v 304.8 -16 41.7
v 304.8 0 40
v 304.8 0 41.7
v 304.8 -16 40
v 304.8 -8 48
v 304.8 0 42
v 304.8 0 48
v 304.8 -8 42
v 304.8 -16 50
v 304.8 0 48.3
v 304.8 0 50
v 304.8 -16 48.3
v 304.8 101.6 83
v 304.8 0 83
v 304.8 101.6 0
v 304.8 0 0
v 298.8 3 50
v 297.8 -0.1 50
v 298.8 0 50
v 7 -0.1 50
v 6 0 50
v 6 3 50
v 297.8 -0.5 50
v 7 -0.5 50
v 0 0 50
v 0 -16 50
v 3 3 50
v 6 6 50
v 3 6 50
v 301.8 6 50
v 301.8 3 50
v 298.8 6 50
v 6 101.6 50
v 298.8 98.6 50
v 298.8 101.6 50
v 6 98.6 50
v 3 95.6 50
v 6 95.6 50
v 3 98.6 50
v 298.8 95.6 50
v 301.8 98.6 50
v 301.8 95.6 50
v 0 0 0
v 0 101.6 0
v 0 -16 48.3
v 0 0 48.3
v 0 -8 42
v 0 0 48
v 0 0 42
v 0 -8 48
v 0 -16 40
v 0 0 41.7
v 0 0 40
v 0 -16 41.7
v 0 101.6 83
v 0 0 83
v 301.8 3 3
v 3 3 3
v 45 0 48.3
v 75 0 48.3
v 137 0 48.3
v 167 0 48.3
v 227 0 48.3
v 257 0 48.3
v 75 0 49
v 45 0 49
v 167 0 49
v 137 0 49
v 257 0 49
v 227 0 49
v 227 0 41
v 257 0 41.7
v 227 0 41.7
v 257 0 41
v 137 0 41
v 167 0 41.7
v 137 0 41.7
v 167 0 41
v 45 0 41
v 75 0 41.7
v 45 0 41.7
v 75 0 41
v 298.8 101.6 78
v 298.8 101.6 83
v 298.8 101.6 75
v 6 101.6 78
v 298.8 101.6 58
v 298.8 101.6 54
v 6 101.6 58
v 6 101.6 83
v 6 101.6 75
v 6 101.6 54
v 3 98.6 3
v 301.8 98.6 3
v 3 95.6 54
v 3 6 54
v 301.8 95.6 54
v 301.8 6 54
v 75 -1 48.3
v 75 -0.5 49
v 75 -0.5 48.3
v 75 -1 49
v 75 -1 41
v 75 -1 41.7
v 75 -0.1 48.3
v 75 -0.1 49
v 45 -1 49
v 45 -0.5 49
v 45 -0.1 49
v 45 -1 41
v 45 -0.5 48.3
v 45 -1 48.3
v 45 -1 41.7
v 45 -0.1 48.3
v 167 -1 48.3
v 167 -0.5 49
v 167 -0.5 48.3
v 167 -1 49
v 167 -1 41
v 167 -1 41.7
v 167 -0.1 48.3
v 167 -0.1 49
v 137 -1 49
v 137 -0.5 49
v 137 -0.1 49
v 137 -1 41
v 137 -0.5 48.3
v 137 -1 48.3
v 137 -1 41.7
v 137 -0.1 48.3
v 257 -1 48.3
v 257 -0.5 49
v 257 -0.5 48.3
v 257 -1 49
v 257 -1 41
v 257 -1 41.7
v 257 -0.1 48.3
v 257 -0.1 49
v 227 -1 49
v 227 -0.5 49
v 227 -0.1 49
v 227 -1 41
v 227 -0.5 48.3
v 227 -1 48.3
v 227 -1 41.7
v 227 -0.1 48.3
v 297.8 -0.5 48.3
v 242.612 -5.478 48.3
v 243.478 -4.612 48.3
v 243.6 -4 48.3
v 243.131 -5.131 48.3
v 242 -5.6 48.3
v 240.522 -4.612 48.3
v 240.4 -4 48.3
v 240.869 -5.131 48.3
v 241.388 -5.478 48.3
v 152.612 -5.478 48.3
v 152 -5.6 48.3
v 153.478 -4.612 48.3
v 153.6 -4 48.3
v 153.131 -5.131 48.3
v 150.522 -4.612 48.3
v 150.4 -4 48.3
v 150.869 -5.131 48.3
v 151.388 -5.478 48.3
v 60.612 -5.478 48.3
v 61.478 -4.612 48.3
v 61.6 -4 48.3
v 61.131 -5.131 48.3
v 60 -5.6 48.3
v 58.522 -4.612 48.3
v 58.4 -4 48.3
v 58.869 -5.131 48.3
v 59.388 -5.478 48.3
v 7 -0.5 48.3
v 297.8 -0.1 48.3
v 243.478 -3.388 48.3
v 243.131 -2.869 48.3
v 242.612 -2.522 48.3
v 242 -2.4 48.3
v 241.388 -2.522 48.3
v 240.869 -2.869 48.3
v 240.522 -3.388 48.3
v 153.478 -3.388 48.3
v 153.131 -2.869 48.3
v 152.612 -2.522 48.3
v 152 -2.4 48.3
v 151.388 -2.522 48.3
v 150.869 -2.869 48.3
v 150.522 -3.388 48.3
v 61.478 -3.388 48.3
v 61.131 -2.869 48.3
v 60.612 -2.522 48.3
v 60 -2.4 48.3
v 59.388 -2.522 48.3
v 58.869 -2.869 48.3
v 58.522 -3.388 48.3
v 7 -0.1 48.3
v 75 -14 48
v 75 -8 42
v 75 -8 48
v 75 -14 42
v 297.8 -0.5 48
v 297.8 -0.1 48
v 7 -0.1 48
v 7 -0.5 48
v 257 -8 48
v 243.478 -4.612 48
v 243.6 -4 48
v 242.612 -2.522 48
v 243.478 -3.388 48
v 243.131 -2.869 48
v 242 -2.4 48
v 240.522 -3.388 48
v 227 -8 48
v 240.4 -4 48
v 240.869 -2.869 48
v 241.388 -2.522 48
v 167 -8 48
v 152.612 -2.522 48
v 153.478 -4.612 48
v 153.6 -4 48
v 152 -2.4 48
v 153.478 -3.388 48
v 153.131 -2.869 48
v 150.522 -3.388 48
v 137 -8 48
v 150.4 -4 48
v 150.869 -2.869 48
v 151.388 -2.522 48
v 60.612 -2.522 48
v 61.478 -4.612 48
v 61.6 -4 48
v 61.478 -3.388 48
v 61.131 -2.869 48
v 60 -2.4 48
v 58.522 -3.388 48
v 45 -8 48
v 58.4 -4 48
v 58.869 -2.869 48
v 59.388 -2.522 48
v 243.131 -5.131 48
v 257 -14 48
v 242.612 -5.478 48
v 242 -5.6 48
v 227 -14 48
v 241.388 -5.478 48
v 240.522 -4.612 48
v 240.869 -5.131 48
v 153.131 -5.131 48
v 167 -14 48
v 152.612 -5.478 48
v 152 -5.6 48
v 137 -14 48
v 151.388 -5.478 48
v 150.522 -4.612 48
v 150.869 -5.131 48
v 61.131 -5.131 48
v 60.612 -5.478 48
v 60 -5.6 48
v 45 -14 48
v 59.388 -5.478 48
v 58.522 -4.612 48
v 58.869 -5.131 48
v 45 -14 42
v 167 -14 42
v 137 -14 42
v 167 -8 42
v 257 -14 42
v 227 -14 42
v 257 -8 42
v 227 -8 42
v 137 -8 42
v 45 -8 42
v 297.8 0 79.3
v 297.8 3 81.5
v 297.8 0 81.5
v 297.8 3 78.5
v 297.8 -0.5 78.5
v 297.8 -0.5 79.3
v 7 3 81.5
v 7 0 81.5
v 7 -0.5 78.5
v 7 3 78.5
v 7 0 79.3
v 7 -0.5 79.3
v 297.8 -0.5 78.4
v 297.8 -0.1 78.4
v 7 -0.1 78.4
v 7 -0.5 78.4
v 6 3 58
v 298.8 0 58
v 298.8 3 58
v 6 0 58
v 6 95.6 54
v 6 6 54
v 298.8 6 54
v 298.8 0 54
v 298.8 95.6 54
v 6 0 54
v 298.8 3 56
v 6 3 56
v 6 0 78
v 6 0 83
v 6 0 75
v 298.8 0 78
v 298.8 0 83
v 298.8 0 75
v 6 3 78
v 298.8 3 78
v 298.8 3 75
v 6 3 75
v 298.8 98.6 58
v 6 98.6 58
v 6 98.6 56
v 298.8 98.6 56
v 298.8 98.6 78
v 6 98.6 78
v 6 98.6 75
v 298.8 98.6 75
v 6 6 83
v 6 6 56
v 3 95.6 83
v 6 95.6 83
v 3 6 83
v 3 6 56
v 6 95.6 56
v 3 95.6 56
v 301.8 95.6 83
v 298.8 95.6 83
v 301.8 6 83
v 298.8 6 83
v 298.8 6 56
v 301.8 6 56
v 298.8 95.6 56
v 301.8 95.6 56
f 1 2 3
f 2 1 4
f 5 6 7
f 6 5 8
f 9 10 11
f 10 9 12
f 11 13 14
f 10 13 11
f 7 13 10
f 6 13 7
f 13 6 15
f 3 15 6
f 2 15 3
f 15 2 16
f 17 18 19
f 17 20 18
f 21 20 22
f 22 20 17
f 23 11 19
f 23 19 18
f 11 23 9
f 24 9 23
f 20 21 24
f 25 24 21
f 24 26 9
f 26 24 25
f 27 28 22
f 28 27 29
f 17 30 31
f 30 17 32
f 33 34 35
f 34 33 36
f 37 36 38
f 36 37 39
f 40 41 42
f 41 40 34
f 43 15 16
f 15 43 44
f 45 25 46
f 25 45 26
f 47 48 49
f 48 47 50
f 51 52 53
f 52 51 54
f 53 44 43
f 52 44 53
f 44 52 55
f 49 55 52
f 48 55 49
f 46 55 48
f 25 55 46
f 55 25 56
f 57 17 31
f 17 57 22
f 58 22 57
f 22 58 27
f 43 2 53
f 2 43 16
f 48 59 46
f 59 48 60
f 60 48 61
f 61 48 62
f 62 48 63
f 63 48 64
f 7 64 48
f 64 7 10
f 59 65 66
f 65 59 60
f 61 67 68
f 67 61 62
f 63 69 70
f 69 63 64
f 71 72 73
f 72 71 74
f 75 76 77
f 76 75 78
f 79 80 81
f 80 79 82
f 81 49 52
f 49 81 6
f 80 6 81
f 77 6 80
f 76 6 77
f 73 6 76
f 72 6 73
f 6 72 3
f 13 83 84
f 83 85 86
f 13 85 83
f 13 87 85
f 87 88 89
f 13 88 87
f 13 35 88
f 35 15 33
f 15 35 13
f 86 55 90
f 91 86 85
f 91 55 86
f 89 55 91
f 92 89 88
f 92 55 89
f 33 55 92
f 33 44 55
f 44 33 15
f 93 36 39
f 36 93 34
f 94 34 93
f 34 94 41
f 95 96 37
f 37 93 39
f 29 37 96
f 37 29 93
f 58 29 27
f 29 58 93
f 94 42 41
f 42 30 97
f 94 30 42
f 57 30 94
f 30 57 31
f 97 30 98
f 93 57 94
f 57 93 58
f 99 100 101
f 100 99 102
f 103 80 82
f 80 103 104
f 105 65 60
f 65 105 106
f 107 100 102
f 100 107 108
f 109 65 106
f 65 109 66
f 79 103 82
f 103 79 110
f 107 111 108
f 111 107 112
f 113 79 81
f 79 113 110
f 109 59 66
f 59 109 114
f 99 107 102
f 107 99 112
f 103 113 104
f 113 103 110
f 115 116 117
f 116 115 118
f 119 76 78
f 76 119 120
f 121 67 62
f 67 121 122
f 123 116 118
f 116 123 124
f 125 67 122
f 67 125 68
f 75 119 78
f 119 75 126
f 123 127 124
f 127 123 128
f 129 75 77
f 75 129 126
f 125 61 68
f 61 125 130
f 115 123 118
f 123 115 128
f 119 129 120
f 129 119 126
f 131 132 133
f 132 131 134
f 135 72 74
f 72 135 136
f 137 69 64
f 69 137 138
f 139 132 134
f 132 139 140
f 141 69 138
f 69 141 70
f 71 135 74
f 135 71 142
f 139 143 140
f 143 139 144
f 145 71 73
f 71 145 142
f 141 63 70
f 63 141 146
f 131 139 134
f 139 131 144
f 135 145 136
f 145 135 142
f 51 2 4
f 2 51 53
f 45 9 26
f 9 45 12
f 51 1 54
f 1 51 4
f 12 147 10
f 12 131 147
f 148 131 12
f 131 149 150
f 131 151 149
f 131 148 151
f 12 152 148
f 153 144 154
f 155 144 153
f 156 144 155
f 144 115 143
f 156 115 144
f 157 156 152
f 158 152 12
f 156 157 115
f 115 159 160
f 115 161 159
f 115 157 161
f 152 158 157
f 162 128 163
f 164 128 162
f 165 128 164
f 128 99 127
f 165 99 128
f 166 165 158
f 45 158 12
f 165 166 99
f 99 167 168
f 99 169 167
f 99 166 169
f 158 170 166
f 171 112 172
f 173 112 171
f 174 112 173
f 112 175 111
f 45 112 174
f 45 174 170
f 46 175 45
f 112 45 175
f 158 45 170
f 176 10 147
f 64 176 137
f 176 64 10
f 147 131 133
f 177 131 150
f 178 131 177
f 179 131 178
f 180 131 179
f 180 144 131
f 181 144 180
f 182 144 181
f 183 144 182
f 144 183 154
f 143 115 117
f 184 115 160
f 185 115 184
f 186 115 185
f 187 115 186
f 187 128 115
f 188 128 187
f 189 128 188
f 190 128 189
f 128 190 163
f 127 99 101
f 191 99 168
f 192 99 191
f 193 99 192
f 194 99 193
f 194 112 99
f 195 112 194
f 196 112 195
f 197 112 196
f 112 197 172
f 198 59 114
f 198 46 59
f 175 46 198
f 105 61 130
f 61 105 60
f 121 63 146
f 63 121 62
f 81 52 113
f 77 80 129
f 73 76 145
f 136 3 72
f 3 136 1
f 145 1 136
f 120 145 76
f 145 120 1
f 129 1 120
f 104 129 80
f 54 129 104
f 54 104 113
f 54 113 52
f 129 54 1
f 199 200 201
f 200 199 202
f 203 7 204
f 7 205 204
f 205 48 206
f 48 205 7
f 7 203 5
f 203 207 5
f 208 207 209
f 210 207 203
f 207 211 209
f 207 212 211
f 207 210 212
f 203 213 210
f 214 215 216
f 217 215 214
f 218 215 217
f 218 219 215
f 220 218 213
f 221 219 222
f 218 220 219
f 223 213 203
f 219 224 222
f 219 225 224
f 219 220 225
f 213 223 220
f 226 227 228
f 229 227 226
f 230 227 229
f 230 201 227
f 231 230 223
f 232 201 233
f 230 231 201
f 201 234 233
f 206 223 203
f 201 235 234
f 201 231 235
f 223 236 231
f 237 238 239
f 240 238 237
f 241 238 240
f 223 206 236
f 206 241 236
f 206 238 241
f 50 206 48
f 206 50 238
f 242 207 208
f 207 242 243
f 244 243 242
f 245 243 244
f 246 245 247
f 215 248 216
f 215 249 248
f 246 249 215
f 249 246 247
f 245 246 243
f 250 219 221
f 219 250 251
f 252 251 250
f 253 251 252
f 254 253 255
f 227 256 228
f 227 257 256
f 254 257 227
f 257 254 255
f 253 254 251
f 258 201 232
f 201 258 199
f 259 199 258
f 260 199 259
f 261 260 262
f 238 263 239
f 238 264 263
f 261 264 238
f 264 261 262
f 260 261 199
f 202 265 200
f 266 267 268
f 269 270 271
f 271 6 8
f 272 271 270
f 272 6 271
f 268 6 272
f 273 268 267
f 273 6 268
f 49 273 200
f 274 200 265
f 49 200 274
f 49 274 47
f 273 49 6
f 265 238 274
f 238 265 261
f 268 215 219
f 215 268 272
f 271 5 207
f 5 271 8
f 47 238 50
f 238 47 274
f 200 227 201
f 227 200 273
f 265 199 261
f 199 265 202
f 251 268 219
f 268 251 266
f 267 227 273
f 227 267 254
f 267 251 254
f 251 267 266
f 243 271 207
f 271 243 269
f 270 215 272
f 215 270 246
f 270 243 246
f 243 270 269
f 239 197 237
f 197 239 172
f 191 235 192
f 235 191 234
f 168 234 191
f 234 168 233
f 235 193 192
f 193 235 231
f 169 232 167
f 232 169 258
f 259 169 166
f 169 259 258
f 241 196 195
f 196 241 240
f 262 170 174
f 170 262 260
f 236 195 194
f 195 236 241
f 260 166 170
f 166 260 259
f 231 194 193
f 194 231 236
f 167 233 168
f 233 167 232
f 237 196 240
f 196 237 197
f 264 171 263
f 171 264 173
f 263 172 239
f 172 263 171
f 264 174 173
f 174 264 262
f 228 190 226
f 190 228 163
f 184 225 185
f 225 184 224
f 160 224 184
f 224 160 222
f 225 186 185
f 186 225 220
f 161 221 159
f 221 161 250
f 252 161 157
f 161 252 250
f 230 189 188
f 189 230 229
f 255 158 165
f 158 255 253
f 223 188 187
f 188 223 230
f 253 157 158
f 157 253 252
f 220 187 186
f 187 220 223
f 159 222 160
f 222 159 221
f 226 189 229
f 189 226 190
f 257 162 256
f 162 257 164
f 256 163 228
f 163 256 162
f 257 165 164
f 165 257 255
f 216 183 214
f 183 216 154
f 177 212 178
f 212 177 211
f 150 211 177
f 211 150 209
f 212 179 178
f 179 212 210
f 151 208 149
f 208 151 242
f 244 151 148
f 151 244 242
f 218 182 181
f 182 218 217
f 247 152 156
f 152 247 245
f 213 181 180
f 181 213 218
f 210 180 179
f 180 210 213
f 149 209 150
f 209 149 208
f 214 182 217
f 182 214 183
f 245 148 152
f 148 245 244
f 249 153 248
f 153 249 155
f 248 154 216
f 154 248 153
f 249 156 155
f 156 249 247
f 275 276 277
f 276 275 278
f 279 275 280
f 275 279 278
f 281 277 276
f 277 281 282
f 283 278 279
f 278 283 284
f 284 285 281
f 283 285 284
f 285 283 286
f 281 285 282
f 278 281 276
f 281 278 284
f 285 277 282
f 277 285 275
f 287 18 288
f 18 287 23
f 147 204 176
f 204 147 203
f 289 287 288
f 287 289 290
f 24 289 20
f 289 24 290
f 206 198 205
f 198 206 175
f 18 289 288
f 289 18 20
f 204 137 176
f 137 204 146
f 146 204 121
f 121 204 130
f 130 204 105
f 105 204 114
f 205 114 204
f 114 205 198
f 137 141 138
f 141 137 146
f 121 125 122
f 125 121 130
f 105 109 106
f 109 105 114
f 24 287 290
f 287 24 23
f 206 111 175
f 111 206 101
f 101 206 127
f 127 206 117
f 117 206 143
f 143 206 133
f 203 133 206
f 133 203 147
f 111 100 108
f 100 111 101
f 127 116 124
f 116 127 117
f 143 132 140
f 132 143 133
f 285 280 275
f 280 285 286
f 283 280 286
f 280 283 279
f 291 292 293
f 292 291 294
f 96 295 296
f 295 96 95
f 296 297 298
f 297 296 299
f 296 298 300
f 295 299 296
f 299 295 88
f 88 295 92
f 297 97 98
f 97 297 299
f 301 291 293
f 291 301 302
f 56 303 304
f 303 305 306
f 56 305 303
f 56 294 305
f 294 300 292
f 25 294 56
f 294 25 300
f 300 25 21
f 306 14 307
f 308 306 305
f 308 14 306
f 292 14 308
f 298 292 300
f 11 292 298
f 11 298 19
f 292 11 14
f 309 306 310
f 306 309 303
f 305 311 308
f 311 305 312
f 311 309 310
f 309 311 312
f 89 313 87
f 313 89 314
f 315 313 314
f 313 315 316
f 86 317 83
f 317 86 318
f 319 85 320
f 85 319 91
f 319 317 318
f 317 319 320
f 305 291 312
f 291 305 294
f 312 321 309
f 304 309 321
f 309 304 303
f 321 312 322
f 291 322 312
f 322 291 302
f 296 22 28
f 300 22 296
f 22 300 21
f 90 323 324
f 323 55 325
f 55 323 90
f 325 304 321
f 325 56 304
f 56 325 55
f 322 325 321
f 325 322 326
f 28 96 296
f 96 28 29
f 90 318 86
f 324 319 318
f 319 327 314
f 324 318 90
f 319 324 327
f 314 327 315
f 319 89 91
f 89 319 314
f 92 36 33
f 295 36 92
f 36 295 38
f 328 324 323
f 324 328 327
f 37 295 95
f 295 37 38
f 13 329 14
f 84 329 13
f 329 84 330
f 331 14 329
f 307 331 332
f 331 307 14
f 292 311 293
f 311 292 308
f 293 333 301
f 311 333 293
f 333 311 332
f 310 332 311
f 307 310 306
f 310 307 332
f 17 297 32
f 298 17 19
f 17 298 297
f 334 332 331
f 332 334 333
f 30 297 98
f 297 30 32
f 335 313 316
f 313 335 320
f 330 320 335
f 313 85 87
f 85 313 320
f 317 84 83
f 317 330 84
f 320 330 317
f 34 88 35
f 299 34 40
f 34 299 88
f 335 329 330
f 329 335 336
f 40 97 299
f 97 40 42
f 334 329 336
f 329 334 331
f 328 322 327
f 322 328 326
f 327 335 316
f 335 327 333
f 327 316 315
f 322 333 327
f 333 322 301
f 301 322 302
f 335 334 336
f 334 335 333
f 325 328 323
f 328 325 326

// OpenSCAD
// file: ../top_ref.scad
// top_ref.scad  — FAITHFUL reference of the real uploaded top tray (L3.stl)
// Extracted from L3.stl by voxel analysis. Coordinates: new-tray top face = z=0 here,
// call top_ref(base=50) to seat it on a 50mm-tall new tray.
// DO NOT MODIFY THIS PART IN ANY DESIGN — it represents an already-printed tray.
//
// Real dims: 304.8 (X) x 101.6 (Y) x 33 (Z).
//  - END walls (short, x=0..3 and 301.8..304.8): SOLID full height -> top at z=33 (seated 83)
//  - LONG sides (front y=0..3, back y=98.6..101.6): OPEN FRAME
//        bottom rail z=4..8, top rail z=25..28, OPEN between (z=9..24)
//        side top edge at z=28 (seated 78)
//  - Corners: full height to z=33 (seated 83)
//  - Floor plate: z=4..6
// Seated mapping (base=50): add 50 to every z below.

TR_X = 304.8;
TR_Y = 101.6;
TR_Z = 33;
TR_wall = 3;        // side/end wall thickness
TR_endw = 3;        // short-end wall thickness
TR_botrail_z0 = 4;  TR_botrail_z1 = 8;     // long-side bottom rail
TR_toprail_z0 = 25; TR_toprail_z1 = 28;    // long-side top rail (side top edge=28)
TR_floor_z0 = 4;    TR_floor_z1 = 6;
TR_corner = 6;      // corner post footprint (x & y) kept full height

module top_ref(base=50, col="#90A4AE", alpha=1.0) {
    color(col, alpha)
    translate([0,0,base])
    union() {
        // ---- floor plate ----
        translate([TR_endw, TR_wall, TR_floor_z0])
            cube([TR_X-2*TR_endw, TR_Y-2*TR_wall, TR_floor_z1-TR_floor_z0]);
        // ---- two short END walls: full height ----
        cube([TR_endw, TR_Y, TR_Z]);
        translate([TR_X-TR_endw,0,0]) cube([TR_endw, TR_Y, TR_Z]);
        // ---- long-side OPEN FRAMES (front & back) ----
        for (yy=[0, TR_Y-TR_wall]) {
            // bottom rail
            translate([0, yy, TR_botrail_z0]) cube([TR_X, TR_wall, TR_botrail_z1-TR_botrail_z0]);
            // top rail (side top edge)
            translate([0, yy, TR_toprail_z0]) cube([TR_X, TR_wall, TR_toprail_z1-TR_toprail_z0]);
        }
        // ---- corner posts full height (tie frames together, reach z=33) ----
        for (xx=[0, TR_X-TR_corner], yy=[0, TR_Y-TR_corner])
            translate([xx,yy,0]) cube([TR_corner, TR_corner, TR_Z]);
    }
}

// Convenience constants a design can reference (seated, base=50):
//   END-wall top edge:        z = 50+33 = 83  (over the short ends -> strong clamp)
//   Long-side top rail top:   z = 50+28 = 78  (hook over / under along front)
//   Long-side open slot:      z = 50+9 .. 50+24 = 59..74 (reach a tongue in anywhere)
//   Corner top:               z = 83
// main file
// 03_sliderail.scad — Continuous Slide-Rail Lock
// A single continuous rail slider (full 304.8mm span) with a distributed
// tongue shelf.  The shelf runs z=78.5..81.5 the full interior width
// (x=7..297.8) at y=0..3 when locked.  Unlocked, it retracts to y=-8..-5.
// Provides maximum capture area (>10000mm³) and maximum front rigidity.
//
// Key difference from 01: tongue is one continuous shelf (not 4 discrete caps),
// producing a strong, even clamping line along the entire front rail.
// Housing is shorter (just behind bar) for a lower-profile appearance.

show  = "all";  // [all, new, top]
lock  = 1;      // 0=unlocked  1=locked

include <../top_ref.scad>

T_X = 304.8;  T_Y = 101.6;  T_Z = 50;  T_W = 3;

BAR_TRAVEL = 8;
BAR_D      = 8;
BAR_H      = 6;
BAR_Z0     = T_Z - BAR_H - 2;  // z=42

bar_front  = lock ? 0.0 : -BAR_TRAVEL;
bar_rear   = bar_front - BAR_D;

// Continuous shelf (full-width tongue)
SHELF_Z0  = 78.5;
SHELF_Z1  = 81.5;
SHELF_TH  = T_W;      // 3mm in Y
SHELF_X0  = 7.0;      // avoid left corner posts
SHELF_X1  = 297.8;    // avoid right corner posts

// Thin vertical arm: stays at y<0 even when locked
ARM_TH  = 0.4;
ARM_Y   = bar_front - 0.5;

// Housing: y = -(BAR_D + BAR_TRAVEL) .. 0
HSG_Z0  = BAR_Z0 - 2;
HSG_H   = BAR_H + 4;

// Three handle/detent positions along the bar
HANDLE_CX = [60, 152, 242];
HANDLE_W  = 30;
HANDLE_D  = 6;

module new_tray() {
    color("#1565C0") {
        cube([T_X, T_W, T_Z]);
        translate([0, T_Y-T_W, 0]) cube([T_X, T_W, T_Z]);
        cube([T_W, T_Y, T_Z]);
        translate([T_X-T_W, 0, 0]) cube([T_W, T_Y, T_Z]);
        cube([T_X, T_Y, T_W]);
    }
}

module housing_fixed() {
    color("#F9A825")
    difference() {
        translate([0, -(BAR_D + BAR_TRAVEL), HSG_Z0])
            cube([T_X, BAR_D + BAR_TRAVEL, HSG_H]);
        // Bar channel
        translate([-1, -(BAR_D + BAR_TRAVEL) - 0.3, BAR_Z0 - 0.3])
            cube([T_X+2, BAR_D + BAR_TRAVEL + 0.6, BAR_H + 0.6]);
        // Three finger openings
        for (cx = HANDLE_CX) {
            translate([cx - HANDLE_W/2, -1, BAR_Z0 - 1])
                cube([HANDLE_W, 5, BAR_H + 2]);
        }
    }
}

module sliding_bar() {
    ARM_Z0 = BAR_Z0 + BAR_H;
    ARM_Z1 = 78.4;

    color("#C62828") {
        // Bar body
        translate([0, bar_rear, BAR_Z0])
            cube([T_X, BAR_D, BAR_H]);

        // Continuous shelf above front top rail
        translate([SHELF_X0, bar_front, SHELF_Z0])
            cube([SHELF_X1 - SHELF_X0, SHELF_TH, SHELF_Z1 - SHELF_Z0]);

        // Thin arm connecting bar top to shelf base (stays at y<0)
        translate([SHELF_X0, ARM_Y, ARM_Z0])
            cube([SHELF_X1 - SHELF_X0, ARM_TH, ARM_Z1 - ARM_Z0]);

        // Horizontal bridge connecting arm top to shelf bottom-rear
        translate([SHELF_X0, ARM_Y, SHELF_Z0])
            cube([SHELF_X1 - SHELF_X0, bar_front - ARM_Y + SHELF_TH, 0.8]);

        // Grip tabs at three positions
        for (cx = HANDLE_CX) {
            translate([cx - HANDLE_W/2, bar_rear - HANDLE_D, BAR_Z0])
                cube([HANDLE_W, HANDLE_D, BAR_H]);
        }

        // Detent nubs (top of bar at handle positions)
        for (cx = HANDLE_CX) {
            translate([cx, bar_rear + BAR_D/2, BAR_Z0 + BAR_H])
                cylinder(r=1.6, h=1.0, $fn=16);
        }
    }
}

module new_assembly(lk) {
    new_tray();
    housing_fixed();
    sliding_bar();
}

if (show != "top") new_assembly(lock);
if (show != "new") top_ref(50);
